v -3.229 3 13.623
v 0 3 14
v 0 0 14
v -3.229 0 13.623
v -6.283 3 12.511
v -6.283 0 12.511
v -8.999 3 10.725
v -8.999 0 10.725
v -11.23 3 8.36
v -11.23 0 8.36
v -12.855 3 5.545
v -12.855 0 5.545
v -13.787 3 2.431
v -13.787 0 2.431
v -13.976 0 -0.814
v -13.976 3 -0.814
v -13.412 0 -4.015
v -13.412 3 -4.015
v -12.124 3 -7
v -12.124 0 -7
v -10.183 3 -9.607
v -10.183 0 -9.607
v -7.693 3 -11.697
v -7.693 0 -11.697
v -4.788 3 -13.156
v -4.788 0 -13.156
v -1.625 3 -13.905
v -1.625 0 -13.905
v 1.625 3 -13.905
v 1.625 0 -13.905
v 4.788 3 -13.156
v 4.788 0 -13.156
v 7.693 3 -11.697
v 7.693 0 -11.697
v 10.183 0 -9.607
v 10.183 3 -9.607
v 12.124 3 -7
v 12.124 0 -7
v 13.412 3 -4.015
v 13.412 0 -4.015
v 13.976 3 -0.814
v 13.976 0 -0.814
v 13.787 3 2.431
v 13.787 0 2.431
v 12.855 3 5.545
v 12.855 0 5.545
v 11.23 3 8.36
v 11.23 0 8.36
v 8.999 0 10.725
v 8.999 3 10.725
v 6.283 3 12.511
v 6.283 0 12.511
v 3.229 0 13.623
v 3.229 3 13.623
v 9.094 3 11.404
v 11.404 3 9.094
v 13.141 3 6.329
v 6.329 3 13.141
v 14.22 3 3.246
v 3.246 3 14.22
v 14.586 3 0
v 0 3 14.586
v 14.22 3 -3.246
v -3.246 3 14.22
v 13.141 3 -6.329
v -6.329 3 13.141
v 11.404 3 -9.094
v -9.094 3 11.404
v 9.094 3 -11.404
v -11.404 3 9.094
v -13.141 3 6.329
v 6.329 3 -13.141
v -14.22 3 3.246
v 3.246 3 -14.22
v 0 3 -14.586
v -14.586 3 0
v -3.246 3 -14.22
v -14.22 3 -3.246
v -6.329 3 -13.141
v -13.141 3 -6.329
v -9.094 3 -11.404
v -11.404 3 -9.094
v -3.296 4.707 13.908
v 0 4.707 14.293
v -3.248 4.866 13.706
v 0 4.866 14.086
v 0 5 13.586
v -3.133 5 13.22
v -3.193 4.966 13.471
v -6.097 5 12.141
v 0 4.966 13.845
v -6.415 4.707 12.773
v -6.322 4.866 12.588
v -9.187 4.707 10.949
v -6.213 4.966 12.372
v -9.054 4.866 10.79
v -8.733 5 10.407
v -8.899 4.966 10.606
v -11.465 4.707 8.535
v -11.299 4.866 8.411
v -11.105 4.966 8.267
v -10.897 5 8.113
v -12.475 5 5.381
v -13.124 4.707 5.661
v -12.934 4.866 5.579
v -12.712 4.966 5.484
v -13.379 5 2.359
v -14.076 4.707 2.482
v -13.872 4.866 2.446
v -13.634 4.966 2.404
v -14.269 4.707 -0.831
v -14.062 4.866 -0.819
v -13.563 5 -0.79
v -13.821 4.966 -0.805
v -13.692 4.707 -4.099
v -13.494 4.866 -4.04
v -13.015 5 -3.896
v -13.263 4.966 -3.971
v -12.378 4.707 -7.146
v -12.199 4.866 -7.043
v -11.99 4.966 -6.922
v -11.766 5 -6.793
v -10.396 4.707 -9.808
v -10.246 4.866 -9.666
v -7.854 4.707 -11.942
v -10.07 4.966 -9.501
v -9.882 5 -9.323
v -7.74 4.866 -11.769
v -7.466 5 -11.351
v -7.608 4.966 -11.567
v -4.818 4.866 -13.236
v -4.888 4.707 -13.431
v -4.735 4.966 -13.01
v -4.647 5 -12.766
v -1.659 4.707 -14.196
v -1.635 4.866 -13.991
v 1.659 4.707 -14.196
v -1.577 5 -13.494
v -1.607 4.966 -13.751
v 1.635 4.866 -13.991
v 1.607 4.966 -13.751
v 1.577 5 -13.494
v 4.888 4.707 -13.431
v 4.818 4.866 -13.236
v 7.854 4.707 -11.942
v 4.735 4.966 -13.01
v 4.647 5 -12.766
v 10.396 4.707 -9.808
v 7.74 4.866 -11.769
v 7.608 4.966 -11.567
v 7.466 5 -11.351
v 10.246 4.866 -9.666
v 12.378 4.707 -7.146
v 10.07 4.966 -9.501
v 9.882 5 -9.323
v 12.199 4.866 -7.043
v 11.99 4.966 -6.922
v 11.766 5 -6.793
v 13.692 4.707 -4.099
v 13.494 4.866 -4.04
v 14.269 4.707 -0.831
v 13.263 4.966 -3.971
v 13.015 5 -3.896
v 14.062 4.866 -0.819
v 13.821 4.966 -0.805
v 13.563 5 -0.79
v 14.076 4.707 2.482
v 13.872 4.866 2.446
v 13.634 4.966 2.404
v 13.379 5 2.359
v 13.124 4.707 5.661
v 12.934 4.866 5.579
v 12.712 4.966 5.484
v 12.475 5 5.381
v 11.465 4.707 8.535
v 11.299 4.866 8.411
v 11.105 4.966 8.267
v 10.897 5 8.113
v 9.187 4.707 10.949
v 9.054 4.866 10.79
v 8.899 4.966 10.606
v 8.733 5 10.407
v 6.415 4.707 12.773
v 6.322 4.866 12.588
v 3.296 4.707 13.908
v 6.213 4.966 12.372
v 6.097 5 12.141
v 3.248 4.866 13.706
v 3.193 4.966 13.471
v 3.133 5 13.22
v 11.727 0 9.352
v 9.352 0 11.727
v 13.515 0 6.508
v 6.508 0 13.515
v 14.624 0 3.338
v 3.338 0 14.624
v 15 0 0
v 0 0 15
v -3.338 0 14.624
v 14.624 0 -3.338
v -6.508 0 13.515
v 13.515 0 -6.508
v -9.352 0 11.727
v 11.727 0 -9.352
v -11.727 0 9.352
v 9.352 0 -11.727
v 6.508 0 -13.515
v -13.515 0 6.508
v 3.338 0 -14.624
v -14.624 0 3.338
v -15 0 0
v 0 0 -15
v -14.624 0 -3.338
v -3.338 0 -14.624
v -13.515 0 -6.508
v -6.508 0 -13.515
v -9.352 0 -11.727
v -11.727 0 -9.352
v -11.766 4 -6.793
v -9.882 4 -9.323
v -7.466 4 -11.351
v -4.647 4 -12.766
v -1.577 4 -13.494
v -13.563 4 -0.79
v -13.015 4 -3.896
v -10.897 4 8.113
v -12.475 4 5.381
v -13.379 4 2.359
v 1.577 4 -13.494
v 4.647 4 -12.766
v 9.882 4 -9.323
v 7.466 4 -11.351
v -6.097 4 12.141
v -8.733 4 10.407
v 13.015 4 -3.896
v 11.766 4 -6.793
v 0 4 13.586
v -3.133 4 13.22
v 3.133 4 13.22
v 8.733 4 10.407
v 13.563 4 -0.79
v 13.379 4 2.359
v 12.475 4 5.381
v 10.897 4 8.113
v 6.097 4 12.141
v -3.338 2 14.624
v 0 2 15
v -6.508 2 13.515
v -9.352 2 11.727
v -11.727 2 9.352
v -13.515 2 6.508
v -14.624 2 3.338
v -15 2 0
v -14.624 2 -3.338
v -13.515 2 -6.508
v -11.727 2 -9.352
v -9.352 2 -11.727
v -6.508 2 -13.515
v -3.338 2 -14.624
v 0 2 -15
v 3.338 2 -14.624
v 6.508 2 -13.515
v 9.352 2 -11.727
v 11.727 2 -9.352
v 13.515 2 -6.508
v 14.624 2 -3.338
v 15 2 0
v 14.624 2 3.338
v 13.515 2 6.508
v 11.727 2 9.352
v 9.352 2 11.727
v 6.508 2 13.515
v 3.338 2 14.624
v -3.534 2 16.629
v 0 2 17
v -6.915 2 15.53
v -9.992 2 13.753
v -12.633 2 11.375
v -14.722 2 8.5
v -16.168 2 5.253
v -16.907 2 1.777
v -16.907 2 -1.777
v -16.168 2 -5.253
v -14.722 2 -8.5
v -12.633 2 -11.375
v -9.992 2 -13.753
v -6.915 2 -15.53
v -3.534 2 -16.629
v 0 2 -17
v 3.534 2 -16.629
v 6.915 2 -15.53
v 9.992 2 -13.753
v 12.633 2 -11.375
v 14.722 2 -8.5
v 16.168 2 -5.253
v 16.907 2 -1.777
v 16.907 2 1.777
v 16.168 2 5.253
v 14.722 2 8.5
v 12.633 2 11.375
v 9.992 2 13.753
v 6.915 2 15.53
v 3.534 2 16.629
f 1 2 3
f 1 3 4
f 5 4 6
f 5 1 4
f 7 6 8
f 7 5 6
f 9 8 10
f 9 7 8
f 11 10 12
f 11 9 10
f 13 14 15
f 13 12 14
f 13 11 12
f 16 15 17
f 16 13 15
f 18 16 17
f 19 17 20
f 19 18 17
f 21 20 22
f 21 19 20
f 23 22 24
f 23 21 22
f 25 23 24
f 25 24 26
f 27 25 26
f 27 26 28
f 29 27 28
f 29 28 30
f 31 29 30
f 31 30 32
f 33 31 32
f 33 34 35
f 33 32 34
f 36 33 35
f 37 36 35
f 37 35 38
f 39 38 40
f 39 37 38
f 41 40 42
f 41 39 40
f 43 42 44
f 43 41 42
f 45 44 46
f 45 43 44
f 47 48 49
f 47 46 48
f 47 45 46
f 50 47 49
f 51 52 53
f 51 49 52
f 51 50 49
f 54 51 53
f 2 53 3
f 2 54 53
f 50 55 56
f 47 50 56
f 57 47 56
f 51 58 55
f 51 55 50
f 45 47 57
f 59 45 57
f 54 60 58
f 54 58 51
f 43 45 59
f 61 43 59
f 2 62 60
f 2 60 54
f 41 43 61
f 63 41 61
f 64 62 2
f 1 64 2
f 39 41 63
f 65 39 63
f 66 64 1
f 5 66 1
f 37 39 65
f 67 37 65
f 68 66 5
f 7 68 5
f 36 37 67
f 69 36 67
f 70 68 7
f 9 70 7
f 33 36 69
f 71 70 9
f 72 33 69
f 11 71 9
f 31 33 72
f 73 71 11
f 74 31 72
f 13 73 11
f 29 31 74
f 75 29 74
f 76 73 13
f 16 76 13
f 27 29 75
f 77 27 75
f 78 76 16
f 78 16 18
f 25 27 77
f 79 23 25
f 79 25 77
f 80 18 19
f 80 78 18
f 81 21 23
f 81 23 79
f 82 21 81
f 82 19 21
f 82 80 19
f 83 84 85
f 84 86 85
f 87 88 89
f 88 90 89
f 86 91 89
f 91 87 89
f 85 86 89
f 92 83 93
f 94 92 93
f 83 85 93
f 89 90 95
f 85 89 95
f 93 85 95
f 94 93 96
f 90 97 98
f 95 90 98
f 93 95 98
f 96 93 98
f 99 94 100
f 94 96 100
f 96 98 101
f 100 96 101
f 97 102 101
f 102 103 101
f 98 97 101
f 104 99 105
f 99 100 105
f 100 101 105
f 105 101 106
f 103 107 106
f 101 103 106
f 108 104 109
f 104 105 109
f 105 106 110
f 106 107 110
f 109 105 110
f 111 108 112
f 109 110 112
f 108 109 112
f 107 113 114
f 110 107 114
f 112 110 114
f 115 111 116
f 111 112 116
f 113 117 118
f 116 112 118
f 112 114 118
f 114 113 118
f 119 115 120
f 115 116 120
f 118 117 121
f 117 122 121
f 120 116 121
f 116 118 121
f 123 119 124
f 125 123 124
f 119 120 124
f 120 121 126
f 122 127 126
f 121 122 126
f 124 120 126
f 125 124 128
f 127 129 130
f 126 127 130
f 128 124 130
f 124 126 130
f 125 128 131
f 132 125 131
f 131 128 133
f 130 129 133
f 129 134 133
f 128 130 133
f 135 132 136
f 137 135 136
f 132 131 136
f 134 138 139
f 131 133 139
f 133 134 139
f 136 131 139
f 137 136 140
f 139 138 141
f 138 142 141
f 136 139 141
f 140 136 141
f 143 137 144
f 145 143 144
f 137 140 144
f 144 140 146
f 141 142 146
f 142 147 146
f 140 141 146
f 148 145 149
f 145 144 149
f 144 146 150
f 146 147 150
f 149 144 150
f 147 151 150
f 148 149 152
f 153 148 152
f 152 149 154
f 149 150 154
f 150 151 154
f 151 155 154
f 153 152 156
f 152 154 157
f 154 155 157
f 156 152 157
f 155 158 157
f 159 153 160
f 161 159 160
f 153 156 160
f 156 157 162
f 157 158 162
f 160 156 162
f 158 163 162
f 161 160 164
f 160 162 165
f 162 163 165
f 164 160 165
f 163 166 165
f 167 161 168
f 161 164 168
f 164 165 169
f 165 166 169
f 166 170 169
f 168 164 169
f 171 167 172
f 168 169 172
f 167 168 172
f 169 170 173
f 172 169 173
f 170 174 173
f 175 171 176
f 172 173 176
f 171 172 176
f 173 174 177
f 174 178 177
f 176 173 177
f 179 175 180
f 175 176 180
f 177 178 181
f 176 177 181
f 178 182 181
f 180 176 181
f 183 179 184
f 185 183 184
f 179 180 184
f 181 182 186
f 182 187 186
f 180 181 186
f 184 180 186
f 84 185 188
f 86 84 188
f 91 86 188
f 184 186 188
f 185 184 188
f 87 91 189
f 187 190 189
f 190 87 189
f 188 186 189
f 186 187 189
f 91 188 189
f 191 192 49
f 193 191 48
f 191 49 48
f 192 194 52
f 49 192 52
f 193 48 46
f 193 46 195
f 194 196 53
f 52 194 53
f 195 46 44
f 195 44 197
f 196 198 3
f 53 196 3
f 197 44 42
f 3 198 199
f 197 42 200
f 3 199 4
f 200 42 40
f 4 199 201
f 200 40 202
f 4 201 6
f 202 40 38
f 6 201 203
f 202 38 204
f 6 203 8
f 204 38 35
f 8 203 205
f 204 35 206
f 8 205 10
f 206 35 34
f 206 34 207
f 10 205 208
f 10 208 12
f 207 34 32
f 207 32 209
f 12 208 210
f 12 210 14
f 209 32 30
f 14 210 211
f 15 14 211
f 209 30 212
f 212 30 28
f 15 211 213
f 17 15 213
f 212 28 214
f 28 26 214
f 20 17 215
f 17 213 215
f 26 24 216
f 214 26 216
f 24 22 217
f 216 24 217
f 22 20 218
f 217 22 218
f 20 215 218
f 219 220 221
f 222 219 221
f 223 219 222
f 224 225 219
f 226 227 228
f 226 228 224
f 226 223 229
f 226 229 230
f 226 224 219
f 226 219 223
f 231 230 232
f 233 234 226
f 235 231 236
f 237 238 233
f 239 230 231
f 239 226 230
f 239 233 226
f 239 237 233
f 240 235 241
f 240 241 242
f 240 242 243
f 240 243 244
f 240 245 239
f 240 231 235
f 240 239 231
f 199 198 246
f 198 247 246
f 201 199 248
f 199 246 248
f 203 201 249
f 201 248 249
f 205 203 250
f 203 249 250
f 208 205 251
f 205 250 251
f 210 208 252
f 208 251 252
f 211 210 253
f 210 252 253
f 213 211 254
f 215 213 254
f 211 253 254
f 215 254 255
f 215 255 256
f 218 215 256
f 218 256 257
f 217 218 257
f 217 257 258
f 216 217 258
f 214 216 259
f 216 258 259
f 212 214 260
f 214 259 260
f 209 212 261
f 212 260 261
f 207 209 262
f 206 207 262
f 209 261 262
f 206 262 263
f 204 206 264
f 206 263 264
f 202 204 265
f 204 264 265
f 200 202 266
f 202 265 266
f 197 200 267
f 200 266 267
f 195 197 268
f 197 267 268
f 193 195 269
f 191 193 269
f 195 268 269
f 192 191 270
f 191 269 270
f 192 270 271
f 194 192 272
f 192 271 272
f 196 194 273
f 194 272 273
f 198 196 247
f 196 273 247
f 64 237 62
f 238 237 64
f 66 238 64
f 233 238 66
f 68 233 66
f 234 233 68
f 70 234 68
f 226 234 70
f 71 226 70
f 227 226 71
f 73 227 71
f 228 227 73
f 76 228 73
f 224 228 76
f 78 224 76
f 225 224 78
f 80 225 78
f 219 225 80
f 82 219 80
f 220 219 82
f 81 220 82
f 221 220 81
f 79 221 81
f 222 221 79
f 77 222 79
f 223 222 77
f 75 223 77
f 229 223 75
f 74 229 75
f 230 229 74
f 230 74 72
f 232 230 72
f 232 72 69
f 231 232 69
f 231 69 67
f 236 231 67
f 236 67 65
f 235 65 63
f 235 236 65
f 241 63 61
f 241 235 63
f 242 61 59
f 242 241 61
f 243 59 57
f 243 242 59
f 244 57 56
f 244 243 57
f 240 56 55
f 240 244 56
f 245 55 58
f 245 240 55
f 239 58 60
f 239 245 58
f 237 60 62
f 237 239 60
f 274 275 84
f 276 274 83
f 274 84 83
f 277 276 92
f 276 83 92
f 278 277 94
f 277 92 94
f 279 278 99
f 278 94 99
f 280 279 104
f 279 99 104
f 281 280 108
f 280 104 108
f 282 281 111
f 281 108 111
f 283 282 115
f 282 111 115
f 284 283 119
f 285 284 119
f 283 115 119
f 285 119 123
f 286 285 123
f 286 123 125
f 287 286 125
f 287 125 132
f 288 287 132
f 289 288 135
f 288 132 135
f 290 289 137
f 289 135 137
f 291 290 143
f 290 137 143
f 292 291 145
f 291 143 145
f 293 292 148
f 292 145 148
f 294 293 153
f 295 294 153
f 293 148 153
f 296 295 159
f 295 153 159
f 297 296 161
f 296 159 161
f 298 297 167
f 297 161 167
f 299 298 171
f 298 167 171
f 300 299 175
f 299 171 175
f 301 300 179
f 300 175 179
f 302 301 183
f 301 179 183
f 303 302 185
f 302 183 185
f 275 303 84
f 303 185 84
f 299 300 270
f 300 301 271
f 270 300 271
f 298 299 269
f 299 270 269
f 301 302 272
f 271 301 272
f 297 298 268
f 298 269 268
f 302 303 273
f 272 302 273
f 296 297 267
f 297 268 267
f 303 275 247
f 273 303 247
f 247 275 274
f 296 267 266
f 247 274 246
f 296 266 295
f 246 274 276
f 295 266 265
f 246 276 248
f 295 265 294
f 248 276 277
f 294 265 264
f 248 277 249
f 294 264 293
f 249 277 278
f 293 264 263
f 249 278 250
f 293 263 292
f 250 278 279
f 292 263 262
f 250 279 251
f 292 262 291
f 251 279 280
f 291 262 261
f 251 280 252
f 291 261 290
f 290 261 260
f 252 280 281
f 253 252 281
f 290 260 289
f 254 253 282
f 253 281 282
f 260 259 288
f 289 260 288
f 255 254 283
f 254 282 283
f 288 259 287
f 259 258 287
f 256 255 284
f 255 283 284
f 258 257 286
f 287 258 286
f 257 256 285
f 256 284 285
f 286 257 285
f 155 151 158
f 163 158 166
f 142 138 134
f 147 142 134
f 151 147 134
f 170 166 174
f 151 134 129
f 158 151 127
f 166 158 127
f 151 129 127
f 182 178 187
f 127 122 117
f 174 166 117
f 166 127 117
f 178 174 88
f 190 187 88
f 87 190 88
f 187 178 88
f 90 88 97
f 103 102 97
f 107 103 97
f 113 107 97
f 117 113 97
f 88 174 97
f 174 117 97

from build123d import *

# Parameters (mm, degrees)
SHELL1_T = -1


with BuildPart() as part:
    # Sketch2 → Revolve1 (revolve)
    with BuildSketch(Plane.XY, mode=Mode.PRIVATE) as revolve1_sk:
        with BuildLine():
            Line((15, 0), (15, 2))
            Line((15, 2), (17, 2))
            Line((17, 2), (14.292893219, 4.707106781))
            ThreePointArc((14.292893219, 4.707106781), (13.96846987, 4.923879533), (13.585786438, 5))
            Line((13.585786438, 5), (0, 5))
            Line((0, 5), (0, 0))
            Line((0, 0), (15, 0))
        make_face()
    revolve(revolve1_sk.sketch.rotate(Axis((0, 5, 0), (0, -1, 0)), 90), axis=Axis((0, 5, 0), (0, -1, 0)))

    # Shell1
    shell1_openings = [part.faces().sort_by_distance(p)[0] for p in [
        (0, 0, 0),
    ]]
    offset(amount=SHELL1_T, openings=shell1_openings, kind=Kind.INTERSECTION)


solid = part.part
